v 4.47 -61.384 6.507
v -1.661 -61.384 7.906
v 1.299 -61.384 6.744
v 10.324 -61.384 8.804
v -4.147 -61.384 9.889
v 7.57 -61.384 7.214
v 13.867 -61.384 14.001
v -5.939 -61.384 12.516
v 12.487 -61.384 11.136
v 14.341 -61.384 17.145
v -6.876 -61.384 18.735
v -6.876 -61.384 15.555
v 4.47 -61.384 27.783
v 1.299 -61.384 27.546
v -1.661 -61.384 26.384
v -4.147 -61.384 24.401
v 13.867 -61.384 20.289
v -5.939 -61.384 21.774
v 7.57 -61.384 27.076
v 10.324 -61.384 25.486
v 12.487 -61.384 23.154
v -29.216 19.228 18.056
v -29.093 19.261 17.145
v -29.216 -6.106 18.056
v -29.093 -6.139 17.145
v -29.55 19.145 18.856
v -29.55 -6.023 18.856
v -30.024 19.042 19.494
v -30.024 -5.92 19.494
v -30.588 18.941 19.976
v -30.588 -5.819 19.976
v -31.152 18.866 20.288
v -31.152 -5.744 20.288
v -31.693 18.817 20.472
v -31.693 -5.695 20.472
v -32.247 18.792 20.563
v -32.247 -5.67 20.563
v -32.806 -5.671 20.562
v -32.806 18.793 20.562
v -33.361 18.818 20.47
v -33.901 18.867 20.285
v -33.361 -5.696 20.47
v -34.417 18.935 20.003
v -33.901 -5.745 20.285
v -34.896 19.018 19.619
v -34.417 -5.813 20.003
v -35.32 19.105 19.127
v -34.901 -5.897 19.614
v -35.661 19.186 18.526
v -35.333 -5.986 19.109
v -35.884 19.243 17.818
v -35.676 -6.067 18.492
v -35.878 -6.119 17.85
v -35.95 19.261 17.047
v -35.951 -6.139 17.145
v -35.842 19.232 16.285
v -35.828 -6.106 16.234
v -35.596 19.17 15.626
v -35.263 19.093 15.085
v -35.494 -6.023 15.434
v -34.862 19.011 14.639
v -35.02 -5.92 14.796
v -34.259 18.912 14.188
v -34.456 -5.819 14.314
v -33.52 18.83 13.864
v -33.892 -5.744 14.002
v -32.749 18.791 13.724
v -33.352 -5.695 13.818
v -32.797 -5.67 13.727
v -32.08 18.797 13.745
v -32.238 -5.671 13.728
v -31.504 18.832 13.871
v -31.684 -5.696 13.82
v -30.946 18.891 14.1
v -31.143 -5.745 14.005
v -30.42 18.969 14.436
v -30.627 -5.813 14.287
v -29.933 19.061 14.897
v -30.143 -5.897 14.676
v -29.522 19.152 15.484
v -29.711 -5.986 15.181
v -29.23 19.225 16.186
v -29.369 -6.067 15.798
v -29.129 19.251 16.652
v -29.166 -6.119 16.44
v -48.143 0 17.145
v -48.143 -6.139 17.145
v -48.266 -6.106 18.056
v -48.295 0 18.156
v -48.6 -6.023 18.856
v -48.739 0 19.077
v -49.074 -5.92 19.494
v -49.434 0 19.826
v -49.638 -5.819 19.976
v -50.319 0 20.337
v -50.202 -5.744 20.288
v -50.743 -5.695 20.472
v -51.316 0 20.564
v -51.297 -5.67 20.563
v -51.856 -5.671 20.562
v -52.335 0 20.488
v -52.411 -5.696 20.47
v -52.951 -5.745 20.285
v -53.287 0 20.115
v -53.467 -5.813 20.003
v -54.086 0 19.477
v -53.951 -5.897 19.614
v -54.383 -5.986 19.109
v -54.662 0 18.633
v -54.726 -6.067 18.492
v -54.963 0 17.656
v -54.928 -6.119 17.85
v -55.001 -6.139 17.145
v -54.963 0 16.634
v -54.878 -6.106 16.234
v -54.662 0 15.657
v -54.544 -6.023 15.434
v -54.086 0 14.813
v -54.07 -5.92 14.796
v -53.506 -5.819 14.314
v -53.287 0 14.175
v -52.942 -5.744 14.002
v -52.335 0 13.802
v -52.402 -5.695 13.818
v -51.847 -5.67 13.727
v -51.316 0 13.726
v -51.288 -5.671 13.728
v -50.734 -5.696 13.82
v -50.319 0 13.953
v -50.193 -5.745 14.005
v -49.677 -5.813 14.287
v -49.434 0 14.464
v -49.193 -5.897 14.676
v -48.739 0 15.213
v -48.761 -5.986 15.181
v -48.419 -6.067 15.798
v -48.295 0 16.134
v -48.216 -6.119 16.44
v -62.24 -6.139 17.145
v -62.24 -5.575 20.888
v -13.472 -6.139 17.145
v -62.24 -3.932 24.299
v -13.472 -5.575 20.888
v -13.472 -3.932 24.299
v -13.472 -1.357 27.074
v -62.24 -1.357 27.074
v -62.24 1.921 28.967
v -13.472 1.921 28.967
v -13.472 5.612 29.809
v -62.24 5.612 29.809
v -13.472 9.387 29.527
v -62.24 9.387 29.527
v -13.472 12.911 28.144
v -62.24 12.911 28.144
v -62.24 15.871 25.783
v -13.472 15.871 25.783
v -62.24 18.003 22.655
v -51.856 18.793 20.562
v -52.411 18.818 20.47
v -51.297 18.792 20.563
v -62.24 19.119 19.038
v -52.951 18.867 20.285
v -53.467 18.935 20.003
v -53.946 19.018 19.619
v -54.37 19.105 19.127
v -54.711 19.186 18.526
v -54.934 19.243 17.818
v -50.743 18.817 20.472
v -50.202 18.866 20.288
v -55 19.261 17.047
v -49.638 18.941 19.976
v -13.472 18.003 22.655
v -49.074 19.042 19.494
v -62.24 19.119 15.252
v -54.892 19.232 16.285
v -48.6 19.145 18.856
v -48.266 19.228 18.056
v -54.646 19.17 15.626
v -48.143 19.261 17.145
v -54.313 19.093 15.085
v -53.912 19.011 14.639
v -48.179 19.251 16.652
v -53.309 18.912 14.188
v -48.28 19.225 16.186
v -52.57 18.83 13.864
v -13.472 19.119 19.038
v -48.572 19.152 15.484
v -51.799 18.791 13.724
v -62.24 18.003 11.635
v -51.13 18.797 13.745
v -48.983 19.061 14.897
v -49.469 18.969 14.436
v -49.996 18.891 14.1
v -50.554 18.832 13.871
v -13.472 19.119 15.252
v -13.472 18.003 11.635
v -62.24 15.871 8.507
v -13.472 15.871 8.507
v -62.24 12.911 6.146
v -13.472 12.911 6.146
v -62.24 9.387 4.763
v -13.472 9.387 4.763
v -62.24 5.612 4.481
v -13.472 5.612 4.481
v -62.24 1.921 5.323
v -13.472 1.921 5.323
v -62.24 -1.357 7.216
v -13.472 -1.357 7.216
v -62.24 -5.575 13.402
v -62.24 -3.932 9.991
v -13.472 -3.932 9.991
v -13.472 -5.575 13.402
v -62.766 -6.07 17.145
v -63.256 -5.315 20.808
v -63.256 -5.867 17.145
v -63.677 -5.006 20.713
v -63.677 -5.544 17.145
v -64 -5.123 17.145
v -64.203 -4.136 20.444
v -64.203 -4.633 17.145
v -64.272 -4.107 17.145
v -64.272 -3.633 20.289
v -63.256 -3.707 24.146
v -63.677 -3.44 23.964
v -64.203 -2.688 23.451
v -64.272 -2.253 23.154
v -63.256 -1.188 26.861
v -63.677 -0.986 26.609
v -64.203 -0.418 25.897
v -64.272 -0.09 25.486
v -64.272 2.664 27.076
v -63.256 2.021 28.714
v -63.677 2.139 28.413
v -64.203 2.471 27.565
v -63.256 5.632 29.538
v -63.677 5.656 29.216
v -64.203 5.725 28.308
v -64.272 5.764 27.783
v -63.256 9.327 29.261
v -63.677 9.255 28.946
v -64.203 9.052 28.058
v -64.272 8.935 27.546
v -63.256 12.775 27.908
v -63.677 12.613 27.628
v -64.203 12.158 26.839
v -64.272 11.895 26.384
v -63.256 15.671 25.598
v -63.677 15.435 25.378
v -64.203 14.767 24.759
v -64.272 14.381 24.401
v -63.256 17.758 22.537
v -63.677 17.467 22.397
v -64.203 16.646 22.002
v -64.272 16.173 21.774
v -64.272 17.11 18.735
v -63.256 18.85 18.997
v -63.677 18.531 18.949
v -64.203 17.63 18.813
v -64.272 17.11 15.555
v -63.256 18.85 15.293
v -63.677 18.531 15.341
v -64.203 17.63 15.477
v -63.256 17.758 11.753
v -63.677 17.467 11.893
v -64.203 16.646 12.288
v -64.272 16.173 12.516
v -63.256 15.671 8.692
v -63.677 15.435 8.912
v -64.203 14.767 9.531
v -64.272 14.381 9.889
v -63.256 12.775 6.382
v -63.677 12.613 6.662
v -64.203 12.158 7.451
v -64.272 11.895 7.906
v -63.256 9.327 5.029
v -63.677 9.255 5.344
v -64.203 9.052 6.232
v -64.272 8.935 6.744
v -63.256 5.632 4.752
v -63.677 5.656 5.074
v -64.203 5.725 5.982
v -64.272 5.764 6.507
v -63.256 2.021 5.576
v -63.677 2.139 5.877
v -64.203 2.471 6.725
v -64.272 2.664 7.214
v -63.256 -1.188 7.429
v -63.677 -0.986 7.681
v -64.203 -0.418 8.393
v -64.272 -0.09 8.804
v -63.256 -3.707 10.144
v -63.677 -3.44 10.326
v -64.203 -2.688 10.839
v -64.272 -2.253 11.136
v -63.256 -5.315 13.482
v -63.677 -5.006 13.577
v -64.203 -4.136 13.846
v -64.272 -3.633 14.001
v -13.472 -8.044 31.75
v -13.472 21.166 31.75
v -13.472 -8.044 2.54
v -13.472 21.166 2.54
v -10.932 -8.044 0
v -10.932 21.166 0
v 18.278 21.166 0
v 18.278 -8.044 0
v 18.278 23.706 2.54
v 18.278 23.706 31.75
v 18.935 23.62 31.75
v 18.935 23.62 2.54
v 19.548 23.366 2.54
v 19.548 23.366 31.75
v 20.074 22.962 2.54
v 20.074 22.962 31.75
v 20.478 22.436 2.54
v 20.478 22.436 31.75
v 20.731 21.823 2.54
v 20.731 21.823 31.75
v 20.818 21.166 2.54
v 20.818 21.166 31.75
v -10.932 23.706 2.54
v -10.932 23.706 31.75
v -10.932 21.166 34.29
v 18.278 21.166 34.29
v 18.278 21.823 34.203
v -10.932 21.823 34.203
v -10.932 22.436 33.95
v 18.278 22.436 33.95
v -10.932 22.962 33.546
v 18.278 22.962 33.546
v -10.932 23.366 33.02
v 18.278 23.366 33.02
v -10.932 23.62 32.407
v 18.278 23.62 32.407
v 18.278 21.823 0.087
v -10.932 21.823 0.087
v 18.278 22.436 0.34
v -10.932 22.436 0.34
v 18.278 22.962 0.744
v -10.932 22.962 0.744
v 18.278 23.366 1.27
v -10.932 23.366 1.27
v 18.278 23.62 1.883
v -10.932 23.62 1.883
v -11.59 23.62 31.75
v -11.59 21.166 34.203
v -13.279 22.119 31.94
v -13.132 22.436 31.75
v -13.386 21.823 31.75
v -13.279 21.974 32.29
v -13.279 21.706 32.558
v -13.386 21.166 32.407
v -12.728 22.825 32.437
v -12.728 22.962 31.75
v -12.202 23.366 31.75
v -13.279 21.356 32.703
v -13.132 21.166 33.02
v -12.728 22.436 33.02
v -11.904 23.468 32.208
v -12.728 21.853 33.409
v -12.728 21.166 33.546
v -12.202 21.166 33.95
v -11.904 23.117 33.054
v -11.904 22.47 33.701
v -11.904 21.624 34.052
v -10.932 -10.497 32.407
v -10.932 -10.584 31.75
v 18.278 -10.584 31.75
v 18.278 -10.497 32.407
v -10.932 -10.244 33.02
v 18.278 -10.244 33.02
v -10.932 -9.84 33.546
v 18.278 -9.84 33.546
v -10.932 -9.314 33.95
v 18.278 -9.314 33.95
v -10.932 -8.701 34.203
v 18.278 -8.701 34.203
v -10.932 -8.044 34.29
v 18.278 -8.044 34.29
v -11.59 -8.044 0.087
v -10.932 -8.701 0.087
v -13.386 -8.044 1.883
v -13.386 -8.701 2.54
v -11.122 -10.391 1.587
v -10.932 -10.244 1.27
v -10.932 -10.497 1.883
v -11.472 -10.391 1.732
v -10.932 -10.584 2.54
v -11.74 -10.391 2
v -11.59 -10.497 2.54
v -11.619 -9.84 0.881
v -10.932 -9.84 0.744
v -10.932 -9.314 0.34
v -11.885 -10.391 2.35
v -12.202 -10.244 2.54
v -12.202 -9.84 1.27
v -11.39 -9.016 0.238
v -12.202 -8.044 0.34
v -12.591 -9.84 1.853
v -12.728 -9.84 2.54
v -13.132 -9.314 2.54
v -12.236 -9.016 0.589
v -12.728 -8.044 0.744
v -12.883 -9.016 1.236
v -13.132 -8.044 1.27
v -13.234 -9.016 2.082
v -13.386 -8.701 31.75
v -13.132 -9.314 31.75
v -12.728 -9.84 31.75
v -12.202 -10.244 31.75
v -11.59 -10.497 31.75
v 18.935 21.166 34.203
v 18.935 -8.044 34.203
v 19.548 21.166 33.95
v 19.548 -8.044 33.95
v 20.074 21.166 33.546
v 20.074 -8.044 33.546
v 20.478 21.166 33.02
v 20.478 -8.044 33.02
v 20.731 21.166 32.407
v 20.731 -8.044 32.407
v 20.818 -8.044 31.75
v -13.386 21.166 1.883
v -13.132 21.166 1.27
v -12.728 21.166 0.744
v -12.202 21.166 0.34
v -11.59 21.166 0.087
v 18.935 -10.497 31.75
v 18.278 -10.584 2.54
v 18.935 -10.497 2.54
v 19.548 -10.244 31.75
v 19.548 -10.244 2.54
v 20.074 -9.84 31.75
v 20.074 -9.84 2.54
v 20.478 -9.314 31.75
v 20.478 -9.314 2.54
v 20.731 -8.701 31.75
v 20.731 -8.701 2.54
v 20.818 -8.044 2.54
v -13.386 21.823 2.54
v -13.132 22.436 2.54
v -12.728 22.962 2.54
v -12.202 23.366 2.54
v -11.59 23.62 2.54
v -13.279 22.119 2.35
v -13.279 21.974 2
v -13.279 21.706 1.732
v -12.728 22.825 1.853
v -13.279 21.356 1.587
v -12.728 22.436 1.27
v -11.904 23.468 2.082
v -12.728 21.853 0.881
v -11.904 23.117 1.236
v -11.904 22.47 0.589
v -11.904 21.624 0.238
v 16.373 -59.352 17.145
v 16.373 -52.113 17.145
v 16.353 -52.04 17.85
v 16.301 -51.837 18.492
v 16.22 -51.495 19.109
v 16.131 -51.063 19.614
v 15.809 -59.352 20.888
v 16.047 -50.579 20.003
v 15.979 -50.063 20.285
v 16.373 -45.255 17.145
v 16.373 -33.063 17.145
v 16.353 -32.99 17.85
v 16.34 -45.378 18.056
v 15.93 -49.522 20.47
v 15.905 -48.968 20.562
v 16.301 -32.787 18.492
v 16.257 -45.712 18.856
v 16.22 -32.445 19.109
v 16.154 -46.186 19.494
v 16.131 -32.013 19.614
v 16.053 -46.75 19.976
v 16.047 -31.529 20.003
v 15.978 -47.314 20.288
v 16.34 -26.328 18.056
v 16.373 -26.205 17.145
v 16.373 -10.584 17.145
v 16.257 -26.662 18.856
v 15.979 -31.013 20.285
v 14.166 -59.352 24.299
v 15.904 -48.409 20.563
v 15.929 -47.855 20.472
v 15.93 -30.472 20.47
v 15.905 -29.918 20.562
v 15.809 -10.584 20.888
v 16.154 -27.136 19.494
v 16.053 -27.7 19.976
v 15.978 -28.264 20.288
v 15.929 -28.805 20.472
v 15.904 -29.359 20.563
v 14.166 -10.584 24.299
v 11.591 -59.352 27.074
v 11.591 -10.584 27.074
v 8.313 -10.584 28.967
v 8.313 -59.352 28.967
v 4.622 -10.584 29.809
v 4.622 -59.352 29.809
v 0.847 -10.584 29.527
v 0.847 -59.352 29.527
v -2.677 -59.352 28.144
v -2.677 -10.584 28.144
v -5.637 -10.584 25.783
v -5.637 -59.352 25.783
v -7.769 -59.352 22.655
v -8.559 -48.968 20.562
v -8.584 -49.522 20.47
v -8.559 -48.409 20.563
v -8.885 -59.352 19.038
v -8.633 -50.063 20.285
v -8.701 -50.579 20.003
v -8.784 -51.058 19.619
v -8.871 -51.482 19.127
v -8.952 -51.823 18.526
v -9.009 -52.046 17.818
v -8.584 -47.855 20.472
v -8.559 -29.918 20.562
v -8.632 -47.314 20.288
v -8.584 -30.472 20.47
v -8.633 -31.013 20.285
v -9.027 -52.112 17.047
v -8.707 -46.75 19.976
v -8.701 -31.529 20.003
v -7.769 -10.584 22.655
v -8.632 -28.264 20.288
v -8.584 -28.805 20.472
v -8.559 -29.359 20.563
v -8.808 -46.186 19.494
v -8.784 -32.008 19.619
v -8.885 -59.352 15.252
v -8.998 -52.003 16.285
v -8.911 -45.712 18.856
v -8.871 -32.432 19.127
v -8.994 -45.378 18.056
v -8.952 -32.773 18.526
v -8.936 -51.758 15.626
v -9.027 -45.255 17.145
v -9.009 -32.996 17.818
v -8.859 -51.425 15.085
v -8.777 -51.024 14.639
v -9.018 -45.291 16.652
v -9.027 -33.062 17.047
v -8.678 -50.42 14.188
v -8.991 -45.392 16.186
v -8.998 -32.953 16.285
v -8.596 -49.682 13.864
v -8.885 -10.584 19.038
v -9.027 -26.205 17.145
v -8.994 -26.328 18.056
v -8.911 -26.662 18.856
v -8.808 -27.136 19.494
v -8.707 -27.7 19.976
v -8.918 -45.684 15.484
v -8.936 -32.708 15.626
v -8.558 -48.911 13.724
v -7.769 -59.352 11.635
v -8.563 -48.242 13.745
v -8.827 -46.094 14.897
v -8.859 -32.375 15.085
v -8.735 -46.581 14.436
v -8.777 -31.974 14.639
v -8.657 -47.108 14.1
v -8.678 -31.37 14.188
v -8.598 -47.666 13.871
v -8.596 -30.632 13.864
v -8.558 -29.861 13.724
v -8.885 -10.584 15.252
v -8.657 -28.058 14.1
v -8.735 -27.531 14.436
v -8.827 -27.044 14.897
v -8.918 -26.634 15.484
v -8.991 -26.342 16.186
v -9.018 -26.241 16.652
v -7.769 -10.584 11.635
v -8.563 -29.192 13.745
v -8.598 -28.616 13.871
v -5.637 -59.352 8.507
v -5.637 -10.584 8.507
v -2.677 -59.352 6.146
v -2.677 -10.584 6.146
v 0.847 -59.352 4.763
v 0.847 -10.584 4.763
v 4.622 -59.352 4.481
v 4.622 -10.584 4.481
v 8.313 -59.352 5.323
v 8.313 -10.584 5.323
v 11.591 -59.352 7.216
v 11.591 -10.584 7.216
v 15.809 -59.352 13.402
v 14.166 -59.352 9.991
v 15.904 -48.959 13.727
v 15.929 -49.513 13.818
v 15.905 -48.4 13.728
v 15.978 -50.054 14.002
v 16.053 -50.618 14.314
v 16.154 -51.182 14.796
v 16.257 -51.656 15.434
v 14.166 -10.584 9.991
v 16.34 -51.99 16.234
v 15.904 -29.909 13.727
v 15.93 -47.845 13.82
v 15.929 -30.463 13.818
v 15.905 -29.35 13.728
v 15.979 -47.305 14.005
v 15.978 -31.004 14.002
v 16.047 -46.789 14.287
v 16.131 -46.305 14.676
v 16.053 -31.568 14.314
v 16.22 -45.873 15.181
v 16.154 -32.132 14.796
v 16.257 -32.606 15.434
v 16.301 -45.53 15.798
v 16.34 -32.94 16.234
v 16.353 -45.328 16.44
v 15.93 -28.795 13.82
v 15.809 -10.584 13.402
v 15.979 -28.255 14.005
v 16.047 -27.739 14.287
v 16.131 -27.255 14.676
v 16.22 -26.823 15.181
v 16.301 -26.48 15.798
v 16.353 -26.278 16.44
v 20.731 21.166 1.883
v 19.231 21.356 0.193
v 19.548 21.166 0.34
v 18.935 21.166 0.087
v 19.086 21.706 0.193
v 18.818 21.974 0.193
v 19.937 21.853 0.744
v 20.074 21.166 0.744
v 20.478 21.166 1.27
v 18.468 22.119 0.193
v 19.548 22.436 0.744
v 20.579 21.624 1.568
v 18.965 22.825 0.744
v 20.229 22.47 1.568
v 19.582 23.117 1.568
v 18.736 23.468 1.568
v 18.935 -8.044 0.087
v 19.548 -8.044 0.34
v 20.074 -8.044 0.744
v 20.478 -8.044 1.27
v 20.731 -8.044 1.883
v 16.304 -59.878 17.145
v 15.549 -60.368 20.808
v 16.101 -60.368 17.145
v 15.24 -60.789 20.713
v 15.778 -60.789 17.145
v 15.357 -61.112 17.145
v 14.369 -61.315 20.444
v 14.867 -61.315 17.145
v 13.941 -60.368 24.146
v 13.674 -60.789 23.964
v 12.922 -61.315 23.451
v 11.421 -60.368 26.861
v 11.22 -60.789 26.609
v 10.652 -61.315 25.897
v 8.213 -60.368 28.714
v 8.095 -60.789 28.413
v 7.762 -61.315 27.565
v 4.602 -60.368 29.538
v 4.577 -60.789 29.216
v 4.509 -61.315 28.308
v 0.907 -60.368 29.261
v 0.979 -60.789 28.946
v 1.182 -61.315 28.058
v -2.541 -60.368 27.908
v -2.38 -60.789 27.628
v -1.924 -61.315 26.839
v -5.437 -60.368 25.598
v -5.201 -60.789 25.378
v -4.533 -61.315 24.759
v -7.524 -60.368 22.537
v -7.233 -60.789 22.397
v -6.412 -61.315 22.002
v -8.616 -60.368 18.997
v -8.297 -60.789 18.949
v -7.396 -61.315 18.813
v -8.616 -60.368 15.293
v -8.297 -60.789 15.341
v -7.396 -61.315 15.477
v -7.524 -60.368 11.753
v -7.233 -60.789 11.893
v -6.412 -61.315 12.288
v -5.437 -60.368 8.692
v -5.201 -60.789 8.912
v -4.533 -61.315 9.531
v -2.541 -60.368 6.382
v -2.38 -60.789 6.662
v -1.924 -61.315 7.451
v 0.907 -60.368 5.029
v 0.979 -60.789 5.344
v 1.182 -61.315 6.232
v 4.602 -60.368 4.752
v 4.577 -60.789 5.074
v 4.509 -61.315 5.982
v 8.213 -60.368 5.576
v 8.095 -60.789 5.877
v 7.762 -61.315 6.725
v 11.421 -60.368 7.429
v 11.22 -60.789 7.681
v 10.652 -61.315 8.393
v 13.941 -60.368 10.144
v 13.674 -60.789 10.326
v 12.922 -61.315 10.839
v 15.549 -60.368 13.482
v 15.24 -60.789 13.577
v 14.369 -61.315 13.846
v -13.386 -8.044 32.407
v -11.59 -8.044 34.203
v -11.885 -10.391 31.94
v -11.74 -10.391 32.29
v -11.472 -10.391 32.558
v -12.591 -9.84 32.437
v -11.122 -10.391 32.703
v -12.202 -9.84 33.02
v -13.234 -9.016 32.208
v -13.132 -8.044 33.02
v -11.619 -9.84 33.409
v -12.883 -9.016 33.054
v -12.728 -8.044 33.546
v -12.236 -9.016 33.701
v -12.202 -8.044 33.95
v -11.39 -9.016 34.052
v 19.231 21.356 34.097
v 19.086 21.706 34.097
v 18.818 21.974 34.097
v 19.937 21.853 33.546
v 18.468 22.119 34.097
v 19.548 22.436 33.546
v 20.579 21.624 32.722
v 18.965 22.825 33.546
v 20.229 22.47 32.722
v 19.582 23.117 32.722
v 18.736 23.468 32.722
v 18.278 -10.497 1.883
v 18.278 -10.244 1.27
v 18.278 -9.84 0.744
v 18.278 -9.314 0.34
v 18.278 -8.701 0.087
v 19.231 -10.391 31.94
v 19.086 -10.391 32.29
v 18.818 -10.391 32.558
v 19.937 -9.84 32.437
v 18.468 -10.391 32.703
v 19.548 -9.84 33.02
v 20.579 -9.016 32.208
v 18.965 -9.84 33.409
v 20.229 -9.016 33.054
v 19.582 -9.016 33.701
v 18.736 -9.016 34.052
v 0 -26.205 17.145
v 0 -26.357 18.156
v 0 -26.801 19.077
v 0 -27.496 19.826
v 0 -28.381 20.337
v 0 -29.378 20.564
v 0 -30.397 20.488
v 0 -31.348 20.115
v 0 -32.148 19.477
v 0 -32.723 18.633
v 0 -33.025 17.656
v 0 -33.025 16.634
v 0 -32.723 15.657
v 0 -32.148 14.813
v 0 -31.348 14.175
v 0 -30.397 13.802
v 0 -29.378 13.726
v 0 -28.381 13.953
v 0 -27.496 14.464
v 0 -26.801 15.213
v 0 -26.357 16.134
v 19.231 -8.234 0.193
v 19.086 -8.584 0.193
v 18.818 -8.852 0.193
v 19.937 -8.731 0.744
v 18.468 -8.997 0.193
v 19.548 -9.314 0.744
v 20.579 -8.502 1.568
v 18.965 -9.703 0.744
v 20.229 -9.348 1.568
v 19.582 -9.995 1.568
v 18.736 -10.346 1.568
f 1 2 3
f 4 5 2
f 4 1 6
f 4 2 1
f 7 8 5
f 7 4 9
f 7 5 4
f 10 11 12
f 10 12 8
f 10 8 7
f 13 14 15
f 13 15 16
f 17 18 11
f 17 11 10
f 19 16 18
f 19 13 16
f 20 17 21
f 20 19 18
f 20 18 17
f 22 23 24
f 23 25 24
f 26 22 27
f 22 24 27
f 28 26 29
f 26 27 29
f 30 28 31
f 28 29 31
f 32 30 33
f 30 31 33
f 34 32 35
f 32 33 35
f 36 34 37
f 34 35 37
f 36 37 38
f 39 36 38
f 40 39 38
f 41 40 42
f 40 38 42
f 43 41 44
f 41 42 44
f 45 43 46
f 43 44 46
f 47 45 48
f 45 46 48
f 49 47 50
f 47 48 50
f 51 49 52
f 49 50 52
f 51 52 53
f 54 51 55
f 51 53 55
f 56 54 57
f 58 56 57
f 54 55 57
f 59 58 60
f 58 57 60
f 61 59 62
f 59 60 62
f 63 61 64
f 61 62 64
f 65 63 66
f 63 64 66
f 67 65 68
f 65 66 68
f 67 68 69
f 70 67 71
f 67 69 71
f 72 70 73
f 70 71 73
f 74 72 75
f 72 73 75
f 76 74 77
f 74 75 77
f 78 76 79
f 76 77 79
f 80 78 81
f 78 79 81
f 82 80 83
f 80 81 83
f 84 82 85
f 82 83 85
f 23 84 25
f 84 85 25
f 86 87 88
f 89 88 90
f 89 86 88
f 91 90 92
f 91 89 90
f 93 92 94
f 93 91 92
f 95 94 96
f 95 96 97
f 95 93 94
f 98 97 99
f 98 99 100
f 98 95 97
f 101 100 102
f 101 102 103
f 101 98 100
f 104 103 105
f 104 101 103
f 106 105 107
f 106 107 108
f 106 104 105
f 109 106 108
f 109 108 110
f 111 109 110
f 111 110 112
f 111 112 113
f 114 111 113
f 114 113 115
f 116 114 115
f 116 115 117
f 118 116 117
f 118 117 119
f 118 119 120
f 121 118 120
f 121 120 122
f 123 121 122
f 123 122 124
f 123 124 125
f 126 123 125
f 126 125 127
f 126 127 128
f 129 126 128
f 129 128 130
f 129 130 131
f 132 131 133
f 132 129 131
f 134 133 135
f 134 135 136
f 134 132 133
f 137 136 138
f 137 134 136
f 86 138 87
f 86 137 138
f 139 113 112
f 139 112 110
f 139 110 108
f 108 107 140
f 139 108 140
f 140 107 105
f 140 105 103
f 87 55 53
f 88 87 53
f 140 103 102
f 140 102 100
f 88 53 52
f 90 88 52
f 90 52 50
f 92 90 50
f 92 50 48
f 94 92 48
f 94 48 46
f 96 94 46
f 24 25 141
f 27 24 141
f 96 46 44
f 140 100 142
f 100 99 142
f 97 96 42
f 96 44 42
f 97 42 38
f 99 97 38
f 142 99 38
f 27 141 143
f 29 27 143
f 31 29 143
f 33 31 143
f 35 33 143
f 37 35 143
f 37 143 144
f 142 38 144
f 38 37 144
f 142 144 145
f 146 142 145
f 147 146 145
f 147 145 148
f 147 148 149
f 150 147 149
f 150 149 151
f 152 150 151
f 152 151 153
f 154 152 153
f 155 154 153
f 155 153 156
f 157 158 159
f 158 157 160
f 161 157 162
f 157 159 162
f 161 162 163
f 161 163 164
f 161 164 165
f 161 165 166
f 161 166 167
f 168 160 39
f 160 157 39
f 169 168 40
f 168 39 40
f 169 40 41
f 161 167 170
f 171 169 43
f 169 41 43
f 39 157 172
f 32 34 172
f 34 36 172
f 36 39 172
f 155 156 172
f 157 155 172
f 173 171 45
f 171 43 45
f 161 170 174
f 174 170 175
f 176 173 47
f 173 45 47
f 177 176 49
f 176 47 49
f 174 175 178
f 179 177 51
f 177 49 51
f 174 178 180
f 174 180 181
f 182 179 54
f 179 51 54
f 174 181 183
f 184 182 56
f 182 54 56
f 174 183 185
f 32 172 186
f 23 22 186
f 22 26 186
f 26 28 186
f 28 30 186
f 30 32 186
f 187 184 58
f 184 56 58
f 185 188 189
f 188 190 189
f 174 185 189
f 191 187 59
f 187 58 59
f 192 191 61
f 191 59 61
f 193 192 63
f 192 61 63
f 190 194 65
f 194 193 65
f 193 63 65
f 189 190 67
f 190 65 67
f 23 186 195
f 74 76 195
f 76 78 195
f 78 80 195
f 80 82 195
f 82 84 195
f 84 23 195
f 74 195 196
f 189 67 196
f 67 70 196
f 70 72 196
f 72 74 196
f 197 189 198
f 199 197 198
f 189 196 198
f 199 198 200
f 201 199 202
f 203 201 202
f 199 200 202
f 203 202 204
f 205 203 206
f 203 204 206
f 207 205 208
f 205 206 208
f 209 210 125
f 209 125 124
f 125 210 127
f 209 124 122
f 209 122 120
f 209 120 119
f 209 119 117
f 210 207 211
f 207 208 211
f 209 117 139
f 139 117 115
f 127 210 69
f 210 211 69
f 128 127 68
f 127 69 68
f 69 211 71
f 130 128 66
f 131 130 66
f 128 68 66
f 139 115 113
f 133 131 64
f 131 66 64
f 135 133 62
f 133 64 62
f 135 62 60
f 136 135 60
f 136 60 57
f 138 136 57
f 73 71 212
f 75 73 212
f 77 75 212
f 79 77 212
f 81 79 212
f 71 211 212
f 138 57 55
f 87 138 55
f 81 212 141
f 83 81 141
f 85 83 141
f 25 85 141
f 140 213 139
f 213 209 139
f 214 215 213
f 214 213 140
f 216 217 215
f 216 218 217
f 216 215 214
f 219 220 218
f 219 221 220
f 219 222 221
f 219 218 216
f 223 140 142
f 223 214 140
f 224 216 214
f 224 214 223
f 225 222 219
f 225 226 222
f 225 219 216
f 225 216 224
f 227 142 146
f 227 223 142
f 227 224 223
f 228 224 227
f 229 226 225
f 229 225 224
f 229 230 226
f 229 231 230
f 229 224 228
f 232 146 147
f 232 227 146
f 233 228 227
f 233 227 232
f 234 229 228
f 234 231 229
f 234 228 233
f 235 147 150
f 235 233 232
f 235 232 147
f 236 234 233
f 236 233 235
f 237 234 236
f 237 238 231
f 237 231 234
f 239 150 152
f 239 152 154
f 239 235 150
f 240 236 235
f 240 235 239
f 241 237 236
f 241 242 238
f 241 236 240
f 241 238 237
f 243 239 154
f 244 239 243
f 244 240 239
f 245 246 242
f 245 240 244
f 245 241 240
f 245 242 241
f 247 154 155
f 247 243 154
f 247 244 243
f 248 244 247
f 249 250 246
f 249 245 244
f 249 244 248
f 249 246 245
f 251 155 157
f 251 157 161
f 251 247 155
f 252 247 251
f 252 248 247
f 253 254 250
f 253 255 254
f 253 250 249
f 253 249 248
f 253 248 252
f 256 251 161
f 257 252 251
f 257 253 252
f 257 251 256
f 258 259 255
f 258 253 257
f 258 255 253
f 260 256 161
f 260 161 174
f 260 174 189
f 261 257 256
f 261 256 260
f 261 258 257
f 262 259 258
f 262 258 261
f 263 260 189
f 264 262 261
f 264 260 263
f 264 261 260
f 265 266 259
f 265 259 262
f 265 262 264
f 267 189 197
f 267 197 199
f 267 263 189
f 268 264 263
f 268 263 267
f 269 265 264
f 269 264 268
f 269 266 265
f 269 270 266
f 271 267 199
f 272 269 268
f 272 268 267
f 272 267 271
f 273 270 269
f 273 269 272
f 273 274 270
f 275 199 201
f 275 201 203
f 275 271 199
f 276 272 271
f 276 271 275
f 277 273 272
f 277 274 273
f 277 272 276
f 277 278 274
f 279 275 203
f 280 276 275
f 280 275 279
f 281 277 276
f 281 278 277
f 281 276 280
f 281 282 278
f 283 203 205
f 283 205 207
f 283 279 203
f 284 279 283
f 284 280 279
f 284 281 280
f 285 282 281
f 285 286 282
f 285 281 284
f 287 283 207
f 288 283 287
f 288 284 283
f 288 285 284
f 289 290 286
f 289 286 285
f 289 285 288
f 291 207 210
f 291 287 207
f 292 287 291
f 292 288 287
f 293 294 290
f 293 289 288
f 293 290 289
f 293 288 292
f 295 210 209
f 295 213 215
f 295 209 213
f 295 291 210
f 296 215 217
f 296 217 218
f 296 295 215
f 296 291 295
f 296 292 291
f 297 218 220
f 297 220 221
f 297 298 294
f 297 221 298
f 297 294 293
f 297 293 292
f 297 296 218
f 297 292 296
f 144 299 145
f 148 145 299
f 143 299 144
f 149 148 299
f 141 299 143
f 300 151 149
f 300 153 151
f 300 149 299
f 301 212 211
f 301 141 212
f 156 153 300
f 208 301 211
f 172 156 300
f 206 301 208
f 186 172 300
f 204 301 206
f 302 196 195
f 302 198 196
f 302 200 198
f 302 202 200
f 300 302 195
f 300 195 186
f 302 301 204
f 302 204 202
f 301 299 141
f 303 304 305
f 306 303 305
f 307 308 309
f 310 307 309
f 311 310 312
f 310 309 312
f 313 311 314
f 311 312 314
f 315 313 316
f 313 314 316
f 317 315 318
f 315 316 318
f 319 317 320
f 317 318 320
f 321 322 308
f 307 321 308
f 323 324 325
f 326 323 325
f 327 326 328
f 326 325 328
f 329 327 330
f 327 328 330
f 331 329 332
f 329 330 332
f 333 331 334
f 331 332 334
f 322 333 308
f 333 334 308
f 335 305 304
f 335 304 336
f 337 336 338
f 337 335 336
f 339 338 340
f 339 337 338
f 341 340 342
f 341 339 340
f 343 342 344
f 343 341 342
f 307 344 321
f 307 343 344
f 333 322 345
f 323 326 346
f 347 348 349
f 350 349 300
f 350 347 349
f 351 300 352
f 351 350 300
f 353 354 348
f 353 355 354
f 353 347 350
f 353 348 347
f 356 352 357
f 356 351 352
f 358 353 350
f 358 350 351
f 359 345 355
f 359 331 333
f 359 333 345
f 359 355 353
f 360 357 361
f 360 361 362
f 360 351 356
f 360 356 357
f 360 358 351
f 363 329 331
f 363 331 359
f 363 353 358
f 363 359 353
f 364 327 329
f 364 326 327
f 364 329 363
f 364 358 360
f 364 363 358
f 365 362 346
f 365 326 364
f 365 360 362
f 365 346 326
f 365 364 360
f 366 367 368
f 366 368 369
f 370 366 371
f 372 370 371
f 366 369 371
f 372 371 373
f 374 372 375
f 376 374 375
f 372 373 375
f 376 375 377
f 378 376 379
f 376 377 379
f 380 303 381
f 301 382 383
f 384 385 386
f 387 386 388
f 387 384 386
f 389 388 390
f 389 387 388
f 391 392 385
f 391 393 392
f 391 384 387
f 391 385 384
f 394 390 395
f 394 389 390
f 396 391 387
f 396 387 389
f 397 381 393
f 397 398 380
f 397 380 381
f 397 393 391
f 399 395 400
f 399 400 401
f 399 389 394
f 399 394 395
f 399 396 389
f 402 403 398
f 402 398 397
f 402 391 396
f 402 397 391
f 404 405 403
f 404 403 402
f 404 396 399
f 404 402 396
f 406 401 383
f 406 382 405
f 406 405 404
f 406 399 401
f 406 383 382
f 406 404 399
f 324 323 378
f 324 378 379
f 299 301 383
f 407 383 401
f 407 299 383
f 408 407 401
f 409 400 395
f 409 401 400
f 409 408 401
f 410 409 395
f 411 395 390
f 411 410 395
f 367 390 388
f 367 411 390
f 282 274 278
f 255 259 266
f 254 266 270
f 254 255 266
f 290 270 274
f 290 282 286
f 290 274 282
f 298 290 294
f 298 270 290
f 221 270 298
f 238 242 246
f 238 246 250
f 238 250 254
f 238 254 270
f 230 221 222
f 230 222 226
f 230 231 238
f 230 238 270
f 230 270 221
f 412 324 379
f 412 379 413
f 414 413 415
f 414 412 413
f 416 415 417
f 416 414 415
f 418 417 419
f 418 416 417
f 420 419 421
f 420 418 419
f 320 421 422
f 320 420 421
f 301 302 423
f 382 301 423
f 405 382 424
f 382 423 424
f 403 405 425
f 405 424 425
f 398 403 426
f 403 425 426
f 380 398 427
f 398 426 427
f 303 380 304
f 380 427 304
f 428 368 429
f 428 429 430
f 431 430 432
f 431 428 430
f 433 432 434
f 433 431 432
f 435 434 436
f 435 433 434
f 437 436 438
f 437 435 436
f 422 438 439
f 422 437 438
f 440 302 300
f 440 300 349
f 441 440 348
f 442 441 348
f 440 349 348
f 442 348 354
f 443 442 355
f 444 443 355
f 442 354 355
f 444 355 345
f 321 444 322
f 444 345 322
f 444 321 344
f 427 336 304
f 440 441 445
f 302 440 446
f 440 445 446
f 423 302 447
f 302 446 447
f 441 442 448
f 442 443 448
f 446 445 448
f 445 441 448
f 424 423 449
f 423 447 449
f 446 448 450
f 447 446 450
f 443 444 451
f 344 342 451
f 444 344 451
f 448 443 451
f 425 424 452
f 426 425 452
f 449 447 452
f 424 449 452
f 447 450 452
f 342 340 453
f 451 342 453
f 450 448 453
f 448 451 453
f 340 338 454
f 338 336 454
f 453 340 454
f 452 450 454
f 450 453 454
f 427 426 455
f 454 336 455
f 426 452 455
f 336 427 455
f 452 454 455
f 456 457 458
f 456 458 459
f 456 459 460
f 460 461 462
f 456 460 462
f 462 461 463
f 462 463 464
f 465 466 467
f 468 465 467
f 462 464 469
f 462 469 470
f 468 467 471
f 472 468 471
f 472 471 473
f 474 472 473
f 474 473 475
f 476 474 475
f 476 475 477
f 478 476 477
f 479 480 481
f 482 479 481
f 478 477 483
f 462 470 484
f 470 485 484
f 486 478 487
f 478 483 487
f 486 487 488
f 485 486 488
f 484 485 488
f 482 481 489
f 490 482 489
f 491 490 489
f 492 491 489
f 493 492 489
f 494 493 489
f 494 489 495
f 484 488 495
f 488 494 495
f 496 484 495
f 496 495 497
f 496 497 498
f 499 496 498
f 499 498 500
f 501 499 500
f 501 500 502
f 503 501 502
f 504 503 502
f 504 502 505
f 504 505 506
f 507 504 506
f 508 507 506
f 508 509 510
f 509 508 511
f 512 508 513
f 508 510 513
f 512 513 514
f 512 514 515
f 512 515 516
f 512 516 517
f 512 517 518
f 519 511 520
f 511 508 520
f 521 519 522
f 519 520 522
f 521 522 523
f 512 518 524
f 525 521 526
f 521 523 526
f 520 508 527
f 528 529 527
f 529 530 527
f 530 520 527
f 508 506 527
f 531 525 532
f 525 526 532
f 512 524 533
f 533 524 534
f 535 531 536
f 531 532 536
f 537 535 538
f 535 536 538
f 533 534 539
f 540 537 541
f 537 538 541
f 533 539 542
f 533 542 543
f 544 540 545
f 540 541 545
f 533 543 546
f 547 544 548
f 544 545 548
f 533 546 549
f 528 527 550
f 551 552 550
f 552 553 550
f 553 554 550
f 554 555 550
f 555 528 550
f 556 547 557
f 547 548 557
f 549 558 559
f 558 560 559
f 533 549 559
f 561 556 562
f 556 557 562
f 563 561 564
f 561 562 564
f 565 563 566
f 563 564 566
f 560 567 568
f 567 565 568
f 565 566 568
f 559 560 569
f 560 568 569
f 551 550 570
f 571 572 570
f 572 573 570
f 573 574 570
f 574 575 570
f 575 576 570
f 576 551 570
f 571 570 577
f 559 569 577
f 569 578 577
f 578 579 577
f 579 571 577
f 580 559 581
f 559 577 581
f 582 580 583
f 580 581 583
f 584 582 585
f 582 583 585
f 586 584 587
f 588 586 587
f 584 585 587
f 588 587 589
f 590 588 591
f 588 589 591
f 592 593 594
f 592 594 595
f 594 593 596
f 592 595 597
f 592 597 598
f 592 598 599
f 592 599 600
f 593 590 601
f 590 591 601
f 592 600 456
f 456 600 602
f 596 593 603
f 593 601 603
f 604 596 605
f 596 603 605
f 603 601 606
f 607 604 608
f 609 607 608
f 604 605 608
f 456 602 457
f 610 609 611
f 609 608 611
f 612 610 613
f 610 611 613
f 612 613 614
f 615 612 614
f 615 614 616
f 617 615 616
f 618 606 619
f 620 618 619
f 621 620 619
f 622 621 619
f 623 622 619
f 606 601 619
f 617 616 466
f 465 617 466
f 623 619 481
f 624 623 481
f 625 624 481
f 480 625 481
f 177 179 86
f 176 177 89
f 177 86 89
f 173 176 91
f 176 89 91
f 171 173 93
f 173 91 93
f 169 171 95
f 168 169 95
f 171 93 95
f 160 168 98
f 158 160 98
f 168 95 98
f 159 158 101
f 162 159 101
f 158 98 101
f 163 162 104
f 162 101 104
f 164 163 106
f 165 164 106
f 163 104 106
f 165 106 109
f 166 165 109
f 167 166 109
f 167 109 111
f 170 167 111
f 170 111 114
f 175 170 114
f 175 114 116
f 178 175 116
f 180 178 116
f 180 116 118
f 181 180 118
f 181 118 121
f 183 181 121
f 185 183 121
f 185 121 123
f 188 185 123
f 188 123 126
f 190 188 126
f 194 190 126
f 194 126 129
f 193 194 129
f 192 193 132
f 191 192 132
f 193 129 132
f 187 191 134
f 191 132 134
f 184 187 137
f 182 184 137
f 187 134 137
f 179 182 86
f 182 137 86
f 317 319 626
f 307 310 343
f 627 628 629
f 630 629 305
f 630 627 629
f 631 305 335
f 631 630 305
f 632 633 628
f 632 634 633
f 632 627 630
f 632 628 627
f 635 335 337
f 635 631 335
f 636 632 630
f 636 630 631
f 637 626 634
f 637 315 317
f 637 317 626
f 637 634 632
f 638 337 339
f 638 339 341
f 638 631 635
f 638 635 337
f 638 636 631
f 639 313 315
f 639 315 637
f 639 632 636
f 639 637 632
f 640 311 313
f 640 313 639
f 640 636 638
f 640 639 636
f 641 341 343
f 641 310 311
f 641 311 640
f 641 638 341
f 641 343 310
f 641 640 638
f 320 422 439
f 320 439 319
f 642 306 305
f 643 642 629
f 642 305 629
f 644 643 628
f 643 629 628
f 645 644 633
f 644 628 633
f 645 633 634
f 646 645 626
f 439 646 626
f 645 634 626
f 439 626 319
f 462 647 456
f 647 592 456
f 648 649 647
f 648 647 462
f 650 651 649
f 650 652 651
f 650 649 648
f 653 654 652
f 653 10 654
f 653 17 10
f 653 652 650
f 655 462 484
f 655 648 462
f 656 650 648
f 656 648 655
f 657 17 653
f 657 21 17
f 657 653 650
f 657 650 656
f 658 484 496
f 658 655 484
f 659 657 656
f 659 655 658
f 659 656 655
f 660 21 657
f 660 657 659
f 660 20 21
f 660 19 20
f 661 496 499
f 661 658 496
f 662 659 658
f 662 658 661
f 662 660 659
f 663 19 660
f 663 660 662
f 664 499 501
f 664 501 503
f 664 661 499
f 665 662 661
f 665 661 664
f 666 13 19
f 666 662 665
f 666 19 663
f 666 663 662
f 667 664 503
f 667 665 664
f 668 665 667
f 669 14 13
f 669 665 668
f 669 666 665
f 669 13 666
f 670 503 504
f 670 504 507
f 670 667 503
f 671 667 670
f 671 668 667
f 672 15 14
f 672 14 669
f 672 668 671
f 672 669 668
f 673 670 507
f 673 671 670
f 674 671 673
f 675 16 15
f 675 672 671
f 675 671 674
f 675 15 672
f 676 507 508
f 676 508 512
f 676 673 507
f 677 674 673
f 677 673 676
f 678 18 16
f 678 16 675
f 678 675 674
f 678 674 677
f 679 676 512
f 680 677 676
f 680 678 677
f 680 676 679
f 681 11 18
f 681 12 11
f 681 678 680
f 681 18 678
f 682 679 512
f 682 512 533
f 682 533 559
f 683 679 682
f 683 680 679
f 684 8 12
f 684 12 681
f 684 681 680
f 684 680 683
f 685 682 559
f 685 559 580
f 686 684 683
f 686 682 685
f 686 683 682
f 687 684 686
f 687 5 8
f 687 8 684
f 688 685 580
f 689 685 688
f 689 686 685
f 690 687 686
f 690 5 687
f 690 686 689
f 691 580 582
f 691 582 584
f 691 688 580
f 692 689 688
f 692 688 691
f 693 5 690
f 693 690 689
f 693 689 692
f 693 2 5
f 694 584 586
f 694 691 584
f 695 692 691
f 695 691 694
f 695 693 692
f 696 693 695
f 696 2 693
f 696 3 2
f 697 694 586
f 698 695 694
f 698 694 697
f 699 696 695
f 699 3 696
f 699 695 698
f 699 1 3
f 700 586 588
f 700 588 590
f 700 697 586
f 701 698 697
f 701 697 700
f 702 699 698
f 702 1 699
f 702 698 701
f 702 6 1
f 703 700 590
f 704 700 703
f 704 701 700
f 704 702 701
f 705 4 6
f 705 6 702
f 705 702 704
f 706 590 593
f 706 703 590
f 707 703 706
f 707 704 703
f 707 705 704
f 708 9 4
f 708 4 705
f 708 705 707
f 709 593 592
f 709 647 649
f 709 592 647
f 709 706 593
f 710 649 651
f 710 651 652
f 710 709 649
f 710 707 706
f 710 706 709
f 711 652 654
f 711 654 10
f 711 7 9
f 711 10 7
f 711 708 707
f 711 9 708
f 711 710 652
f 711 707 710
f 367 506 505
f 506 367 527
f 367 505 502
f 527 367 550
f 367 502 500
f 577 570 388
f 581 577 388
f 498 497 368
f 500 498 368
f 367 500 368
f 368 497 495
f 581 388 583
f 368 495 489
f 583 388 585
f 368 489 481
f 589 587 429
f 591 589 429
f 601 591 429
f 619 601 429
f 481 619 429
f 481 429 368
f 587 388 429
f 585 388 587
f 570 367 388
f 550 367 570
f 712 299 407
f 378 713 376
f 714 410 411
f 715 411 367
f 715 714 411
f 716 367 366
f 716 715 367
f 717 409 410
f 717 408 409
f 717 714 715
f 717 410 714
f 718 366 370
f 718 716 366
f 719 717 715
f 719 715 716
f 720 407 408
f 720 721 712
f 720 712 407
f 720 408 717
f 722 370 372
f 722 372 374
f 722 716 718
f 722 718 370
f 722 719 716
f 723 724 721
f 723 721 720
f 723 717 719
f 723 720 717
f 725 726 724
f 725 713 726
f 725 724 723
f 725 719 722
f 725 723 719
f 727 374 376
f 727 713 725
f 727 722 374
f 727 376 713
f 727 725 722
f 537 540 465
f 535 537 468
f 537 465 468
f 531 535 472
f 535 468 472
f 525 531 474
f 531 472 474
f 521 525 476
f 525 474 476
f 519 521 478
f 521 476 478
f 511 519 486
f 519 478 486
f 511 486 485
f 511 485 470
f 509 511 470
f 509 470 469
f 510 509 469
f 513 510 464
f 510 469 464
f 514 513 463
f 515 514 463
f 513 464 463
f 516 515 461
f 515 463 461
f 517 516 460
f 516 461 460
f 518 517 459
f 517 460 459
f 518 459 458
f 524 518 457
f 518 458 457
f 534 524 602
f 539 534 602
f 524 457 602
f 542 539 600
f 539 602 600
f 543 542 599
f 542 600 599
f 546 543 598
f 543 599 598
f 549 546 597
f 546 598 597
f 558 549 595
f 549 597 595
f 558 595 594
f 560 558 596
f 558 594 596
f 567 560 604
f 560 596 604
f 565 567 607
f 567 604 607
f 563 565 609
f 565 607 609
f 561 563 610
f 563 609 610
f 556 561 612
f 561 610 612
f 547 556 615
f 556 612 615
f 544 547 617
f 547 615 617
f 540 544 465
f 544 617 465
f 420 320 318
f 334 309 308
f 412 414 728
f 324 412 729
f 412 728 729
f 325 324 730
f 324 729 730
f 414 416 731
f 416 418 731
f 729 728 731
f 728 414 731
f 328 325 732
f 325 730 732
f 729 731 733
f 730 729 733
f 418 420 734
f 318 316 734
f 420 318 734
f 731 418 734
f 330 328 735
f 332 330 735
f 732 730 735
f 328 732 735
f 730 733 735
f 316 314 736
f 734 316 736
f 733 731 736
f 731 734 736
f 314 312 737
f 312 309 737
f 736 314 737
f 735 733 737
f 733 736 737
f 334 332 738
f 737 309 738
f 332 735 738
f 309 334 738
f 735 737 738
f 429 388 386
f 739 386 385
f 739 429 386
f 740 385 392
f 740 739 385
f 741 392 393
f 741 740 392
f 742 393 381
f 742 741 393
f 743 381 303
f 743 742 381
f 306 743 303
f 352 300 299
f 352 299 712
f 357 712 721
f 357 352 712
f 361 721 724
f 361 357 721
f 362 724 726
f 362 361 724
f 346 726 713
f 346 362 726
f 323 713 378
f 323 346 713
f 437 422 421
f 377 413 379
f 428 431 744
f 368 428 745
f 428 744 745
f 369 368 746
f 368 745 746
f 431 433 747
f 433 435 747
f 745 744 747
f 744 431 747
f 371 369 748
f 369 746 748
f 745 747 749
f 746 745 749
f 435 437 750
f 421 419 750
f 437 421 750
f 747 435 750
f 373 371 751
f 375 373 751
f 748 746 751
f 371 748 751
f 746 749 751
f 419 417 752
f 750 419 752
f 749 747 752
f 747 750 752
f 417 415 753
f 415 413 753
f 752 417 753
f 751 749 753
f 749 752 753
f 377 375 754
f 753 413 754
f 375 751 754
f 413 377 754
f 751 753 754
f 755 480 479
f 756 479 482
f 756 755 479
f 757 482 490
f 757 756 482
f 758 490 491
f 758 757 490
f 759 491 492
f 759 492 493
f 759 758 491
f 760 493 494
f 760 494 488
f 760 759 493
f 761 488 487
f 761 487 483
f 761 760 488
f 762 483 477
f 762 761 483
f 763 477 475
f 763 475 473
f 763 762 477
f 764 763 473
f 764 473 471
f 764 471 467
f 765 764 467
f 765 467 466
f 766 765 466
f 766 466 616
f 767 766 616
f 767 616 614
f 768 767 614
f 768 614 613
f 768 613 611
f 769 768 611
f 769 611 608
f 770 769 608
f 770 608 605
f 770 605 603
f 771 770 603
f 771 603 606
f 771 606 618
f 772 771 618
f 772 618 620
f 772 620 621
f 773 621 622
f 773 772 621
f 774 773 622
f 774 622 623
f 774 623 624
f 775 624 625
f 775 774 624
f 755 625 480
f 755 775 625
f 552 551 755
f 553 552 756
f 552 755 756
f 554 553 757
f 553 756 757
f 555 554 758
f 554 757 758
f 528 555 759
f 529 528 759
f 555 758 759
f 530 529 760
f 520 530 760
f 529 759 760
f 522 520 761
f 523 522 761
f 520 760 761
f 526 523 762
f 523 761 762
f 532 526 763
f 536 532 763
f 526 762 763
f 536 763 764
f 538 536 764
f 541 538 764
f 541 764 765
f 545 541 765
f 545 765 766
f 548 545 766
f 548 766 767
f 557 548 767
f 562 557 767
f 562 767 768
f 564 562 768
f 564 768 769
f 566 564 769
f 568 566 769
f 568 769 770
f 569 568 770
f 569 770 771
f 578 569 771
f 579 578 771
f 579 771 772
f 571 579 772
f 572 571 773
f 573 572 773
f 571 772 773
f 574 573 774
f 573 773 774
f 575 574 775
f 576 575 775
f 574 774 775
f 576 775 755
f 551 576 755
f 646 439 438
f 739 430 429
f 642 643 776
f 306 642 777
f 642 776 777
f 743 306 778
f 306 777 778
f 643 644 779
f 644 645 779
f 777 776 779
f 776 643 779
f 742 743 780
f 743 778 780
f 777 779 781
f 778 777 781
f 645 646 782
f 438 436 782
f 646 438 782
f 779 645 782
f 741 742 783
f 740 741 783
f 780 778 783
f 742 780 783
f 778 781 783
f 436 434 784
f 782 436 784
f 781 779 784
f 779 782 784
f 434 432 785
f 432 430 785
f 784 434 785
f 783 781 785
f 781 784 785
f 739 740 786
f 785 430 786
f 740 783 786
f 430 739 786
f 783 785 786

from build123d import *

# Parameters (mm, degrees)
F0_W      = 34.29
F0_H      = 34.29
F1_DEPTH  = 34.29
F2_R      = 12.7
F3_DEPTH  = 50.8
F4_R      = 12.7
F5_DEPTH  = 50.8
F6_R      = 3.429
F7_DEPTH  = 25.4
F8_R      = 3.429
F9_DEPTH  = 25.4
F10_R     = 3.429
F11_DEPTH = 25.4
F12_R     = 2.032
F13_R     = 2.54


with BuildPart() as f1:
    # F0 (on Top) → F1 (new body)
    with BuildSketch(Plane.XY):
        with Locations((3.6728888822, 6.5610635031)):
            Rectangle(F0_W, F0_H)
    extrude(amount=F1_DEPTH)

    # F2 (on face) → F3 (join)
    with BuildSketch(Plane(origin=(-13.4721111178, 0, 0), x_dir=(0, -1, 0), z_dir=(-1, 0, 0))):
        with Locations((-6.5610635031, 17.145)):
            Circle(F2_R)
    extrude(amount=F3_DEPTH)

    # F4 (on face) → F5 (join)
    with BuildSketch(Plane.XZ.offset(10.5839364969)):
        with Locations((3.6728888822, 17.145)):
            Circle(F4_R)
    extrude(amount=F5_DEPTH)

    # F6 (on Front) → F7 (cut, symmetric)
    with BuildSketch(Plane.XZ):
        with Locations((3.6728888822, 53.34)):
            Circle(F6_R)
        with Locations((3.6728888822, 72.39)):
            Circle(F6_R)
    extrude(amount=F7_DEPTH, both=True, mode=Mode.SUBTRACT)

    # F8 (on Right) → F9 (cut, symmetric)
    with BuildSketch(Plane.YZ):
        with Locations((-29.6339364969, 17.145)):
            Circle(F8_R)
        with Locations((-48.6839364969, 17.145)):
            Circle(F8_R)
    extrude(amount=F9_DEPTH, both=True, mode=Mode.SUBTRACT)

    # F10 (on Front) → F11 (cut, symmetric)
    with BuildSketch(Plane.XZ):
        with Locations((-51.5721111178, 17.145)):
            Circle(F10_R)
        with Locations((-32.5221111178, 17.145)):
            Circle(F10_R)
    extrude(amount=F11_DEPTH, both=True, mode=Mode.SUBTRACT)

    # F12
    f12_edges = [f1.edges().sort_by_distance(p)[0] for p in [
        (-9.027111, -61.383936, 17.145),
        (-64.272111, 19.261064, 17.145),
    ]]
    fillet(f12_edges, radius=F12_R)

    # F13
    f13_edges = [f1.edges().sort_by_distance(p)[0] for p in [
        (20.817889, 23.706064, 17.145),
        (20.817889, 6.561064, 34.29),
        (20.817889, -10.583936, 17.145),
        (20.817889, 6.561064, 0),
        (3.672889, 23.706064, 0),
        (3.672889, 23.706064, 34.29),
        (-13.472111, 23.706064, 17.145),
        (-13.472111, 6.561064, 0),
        (3.672889, -10.583936, 0),
        (-13.472111, 6.561064, 34.29),
        (-13.472111, -10.583936, 17.145),
        (3.672889, -10.583936, 34.29),
    ]]
    fillet(f13_edges, radius=F13_R)


solid = f1.part
